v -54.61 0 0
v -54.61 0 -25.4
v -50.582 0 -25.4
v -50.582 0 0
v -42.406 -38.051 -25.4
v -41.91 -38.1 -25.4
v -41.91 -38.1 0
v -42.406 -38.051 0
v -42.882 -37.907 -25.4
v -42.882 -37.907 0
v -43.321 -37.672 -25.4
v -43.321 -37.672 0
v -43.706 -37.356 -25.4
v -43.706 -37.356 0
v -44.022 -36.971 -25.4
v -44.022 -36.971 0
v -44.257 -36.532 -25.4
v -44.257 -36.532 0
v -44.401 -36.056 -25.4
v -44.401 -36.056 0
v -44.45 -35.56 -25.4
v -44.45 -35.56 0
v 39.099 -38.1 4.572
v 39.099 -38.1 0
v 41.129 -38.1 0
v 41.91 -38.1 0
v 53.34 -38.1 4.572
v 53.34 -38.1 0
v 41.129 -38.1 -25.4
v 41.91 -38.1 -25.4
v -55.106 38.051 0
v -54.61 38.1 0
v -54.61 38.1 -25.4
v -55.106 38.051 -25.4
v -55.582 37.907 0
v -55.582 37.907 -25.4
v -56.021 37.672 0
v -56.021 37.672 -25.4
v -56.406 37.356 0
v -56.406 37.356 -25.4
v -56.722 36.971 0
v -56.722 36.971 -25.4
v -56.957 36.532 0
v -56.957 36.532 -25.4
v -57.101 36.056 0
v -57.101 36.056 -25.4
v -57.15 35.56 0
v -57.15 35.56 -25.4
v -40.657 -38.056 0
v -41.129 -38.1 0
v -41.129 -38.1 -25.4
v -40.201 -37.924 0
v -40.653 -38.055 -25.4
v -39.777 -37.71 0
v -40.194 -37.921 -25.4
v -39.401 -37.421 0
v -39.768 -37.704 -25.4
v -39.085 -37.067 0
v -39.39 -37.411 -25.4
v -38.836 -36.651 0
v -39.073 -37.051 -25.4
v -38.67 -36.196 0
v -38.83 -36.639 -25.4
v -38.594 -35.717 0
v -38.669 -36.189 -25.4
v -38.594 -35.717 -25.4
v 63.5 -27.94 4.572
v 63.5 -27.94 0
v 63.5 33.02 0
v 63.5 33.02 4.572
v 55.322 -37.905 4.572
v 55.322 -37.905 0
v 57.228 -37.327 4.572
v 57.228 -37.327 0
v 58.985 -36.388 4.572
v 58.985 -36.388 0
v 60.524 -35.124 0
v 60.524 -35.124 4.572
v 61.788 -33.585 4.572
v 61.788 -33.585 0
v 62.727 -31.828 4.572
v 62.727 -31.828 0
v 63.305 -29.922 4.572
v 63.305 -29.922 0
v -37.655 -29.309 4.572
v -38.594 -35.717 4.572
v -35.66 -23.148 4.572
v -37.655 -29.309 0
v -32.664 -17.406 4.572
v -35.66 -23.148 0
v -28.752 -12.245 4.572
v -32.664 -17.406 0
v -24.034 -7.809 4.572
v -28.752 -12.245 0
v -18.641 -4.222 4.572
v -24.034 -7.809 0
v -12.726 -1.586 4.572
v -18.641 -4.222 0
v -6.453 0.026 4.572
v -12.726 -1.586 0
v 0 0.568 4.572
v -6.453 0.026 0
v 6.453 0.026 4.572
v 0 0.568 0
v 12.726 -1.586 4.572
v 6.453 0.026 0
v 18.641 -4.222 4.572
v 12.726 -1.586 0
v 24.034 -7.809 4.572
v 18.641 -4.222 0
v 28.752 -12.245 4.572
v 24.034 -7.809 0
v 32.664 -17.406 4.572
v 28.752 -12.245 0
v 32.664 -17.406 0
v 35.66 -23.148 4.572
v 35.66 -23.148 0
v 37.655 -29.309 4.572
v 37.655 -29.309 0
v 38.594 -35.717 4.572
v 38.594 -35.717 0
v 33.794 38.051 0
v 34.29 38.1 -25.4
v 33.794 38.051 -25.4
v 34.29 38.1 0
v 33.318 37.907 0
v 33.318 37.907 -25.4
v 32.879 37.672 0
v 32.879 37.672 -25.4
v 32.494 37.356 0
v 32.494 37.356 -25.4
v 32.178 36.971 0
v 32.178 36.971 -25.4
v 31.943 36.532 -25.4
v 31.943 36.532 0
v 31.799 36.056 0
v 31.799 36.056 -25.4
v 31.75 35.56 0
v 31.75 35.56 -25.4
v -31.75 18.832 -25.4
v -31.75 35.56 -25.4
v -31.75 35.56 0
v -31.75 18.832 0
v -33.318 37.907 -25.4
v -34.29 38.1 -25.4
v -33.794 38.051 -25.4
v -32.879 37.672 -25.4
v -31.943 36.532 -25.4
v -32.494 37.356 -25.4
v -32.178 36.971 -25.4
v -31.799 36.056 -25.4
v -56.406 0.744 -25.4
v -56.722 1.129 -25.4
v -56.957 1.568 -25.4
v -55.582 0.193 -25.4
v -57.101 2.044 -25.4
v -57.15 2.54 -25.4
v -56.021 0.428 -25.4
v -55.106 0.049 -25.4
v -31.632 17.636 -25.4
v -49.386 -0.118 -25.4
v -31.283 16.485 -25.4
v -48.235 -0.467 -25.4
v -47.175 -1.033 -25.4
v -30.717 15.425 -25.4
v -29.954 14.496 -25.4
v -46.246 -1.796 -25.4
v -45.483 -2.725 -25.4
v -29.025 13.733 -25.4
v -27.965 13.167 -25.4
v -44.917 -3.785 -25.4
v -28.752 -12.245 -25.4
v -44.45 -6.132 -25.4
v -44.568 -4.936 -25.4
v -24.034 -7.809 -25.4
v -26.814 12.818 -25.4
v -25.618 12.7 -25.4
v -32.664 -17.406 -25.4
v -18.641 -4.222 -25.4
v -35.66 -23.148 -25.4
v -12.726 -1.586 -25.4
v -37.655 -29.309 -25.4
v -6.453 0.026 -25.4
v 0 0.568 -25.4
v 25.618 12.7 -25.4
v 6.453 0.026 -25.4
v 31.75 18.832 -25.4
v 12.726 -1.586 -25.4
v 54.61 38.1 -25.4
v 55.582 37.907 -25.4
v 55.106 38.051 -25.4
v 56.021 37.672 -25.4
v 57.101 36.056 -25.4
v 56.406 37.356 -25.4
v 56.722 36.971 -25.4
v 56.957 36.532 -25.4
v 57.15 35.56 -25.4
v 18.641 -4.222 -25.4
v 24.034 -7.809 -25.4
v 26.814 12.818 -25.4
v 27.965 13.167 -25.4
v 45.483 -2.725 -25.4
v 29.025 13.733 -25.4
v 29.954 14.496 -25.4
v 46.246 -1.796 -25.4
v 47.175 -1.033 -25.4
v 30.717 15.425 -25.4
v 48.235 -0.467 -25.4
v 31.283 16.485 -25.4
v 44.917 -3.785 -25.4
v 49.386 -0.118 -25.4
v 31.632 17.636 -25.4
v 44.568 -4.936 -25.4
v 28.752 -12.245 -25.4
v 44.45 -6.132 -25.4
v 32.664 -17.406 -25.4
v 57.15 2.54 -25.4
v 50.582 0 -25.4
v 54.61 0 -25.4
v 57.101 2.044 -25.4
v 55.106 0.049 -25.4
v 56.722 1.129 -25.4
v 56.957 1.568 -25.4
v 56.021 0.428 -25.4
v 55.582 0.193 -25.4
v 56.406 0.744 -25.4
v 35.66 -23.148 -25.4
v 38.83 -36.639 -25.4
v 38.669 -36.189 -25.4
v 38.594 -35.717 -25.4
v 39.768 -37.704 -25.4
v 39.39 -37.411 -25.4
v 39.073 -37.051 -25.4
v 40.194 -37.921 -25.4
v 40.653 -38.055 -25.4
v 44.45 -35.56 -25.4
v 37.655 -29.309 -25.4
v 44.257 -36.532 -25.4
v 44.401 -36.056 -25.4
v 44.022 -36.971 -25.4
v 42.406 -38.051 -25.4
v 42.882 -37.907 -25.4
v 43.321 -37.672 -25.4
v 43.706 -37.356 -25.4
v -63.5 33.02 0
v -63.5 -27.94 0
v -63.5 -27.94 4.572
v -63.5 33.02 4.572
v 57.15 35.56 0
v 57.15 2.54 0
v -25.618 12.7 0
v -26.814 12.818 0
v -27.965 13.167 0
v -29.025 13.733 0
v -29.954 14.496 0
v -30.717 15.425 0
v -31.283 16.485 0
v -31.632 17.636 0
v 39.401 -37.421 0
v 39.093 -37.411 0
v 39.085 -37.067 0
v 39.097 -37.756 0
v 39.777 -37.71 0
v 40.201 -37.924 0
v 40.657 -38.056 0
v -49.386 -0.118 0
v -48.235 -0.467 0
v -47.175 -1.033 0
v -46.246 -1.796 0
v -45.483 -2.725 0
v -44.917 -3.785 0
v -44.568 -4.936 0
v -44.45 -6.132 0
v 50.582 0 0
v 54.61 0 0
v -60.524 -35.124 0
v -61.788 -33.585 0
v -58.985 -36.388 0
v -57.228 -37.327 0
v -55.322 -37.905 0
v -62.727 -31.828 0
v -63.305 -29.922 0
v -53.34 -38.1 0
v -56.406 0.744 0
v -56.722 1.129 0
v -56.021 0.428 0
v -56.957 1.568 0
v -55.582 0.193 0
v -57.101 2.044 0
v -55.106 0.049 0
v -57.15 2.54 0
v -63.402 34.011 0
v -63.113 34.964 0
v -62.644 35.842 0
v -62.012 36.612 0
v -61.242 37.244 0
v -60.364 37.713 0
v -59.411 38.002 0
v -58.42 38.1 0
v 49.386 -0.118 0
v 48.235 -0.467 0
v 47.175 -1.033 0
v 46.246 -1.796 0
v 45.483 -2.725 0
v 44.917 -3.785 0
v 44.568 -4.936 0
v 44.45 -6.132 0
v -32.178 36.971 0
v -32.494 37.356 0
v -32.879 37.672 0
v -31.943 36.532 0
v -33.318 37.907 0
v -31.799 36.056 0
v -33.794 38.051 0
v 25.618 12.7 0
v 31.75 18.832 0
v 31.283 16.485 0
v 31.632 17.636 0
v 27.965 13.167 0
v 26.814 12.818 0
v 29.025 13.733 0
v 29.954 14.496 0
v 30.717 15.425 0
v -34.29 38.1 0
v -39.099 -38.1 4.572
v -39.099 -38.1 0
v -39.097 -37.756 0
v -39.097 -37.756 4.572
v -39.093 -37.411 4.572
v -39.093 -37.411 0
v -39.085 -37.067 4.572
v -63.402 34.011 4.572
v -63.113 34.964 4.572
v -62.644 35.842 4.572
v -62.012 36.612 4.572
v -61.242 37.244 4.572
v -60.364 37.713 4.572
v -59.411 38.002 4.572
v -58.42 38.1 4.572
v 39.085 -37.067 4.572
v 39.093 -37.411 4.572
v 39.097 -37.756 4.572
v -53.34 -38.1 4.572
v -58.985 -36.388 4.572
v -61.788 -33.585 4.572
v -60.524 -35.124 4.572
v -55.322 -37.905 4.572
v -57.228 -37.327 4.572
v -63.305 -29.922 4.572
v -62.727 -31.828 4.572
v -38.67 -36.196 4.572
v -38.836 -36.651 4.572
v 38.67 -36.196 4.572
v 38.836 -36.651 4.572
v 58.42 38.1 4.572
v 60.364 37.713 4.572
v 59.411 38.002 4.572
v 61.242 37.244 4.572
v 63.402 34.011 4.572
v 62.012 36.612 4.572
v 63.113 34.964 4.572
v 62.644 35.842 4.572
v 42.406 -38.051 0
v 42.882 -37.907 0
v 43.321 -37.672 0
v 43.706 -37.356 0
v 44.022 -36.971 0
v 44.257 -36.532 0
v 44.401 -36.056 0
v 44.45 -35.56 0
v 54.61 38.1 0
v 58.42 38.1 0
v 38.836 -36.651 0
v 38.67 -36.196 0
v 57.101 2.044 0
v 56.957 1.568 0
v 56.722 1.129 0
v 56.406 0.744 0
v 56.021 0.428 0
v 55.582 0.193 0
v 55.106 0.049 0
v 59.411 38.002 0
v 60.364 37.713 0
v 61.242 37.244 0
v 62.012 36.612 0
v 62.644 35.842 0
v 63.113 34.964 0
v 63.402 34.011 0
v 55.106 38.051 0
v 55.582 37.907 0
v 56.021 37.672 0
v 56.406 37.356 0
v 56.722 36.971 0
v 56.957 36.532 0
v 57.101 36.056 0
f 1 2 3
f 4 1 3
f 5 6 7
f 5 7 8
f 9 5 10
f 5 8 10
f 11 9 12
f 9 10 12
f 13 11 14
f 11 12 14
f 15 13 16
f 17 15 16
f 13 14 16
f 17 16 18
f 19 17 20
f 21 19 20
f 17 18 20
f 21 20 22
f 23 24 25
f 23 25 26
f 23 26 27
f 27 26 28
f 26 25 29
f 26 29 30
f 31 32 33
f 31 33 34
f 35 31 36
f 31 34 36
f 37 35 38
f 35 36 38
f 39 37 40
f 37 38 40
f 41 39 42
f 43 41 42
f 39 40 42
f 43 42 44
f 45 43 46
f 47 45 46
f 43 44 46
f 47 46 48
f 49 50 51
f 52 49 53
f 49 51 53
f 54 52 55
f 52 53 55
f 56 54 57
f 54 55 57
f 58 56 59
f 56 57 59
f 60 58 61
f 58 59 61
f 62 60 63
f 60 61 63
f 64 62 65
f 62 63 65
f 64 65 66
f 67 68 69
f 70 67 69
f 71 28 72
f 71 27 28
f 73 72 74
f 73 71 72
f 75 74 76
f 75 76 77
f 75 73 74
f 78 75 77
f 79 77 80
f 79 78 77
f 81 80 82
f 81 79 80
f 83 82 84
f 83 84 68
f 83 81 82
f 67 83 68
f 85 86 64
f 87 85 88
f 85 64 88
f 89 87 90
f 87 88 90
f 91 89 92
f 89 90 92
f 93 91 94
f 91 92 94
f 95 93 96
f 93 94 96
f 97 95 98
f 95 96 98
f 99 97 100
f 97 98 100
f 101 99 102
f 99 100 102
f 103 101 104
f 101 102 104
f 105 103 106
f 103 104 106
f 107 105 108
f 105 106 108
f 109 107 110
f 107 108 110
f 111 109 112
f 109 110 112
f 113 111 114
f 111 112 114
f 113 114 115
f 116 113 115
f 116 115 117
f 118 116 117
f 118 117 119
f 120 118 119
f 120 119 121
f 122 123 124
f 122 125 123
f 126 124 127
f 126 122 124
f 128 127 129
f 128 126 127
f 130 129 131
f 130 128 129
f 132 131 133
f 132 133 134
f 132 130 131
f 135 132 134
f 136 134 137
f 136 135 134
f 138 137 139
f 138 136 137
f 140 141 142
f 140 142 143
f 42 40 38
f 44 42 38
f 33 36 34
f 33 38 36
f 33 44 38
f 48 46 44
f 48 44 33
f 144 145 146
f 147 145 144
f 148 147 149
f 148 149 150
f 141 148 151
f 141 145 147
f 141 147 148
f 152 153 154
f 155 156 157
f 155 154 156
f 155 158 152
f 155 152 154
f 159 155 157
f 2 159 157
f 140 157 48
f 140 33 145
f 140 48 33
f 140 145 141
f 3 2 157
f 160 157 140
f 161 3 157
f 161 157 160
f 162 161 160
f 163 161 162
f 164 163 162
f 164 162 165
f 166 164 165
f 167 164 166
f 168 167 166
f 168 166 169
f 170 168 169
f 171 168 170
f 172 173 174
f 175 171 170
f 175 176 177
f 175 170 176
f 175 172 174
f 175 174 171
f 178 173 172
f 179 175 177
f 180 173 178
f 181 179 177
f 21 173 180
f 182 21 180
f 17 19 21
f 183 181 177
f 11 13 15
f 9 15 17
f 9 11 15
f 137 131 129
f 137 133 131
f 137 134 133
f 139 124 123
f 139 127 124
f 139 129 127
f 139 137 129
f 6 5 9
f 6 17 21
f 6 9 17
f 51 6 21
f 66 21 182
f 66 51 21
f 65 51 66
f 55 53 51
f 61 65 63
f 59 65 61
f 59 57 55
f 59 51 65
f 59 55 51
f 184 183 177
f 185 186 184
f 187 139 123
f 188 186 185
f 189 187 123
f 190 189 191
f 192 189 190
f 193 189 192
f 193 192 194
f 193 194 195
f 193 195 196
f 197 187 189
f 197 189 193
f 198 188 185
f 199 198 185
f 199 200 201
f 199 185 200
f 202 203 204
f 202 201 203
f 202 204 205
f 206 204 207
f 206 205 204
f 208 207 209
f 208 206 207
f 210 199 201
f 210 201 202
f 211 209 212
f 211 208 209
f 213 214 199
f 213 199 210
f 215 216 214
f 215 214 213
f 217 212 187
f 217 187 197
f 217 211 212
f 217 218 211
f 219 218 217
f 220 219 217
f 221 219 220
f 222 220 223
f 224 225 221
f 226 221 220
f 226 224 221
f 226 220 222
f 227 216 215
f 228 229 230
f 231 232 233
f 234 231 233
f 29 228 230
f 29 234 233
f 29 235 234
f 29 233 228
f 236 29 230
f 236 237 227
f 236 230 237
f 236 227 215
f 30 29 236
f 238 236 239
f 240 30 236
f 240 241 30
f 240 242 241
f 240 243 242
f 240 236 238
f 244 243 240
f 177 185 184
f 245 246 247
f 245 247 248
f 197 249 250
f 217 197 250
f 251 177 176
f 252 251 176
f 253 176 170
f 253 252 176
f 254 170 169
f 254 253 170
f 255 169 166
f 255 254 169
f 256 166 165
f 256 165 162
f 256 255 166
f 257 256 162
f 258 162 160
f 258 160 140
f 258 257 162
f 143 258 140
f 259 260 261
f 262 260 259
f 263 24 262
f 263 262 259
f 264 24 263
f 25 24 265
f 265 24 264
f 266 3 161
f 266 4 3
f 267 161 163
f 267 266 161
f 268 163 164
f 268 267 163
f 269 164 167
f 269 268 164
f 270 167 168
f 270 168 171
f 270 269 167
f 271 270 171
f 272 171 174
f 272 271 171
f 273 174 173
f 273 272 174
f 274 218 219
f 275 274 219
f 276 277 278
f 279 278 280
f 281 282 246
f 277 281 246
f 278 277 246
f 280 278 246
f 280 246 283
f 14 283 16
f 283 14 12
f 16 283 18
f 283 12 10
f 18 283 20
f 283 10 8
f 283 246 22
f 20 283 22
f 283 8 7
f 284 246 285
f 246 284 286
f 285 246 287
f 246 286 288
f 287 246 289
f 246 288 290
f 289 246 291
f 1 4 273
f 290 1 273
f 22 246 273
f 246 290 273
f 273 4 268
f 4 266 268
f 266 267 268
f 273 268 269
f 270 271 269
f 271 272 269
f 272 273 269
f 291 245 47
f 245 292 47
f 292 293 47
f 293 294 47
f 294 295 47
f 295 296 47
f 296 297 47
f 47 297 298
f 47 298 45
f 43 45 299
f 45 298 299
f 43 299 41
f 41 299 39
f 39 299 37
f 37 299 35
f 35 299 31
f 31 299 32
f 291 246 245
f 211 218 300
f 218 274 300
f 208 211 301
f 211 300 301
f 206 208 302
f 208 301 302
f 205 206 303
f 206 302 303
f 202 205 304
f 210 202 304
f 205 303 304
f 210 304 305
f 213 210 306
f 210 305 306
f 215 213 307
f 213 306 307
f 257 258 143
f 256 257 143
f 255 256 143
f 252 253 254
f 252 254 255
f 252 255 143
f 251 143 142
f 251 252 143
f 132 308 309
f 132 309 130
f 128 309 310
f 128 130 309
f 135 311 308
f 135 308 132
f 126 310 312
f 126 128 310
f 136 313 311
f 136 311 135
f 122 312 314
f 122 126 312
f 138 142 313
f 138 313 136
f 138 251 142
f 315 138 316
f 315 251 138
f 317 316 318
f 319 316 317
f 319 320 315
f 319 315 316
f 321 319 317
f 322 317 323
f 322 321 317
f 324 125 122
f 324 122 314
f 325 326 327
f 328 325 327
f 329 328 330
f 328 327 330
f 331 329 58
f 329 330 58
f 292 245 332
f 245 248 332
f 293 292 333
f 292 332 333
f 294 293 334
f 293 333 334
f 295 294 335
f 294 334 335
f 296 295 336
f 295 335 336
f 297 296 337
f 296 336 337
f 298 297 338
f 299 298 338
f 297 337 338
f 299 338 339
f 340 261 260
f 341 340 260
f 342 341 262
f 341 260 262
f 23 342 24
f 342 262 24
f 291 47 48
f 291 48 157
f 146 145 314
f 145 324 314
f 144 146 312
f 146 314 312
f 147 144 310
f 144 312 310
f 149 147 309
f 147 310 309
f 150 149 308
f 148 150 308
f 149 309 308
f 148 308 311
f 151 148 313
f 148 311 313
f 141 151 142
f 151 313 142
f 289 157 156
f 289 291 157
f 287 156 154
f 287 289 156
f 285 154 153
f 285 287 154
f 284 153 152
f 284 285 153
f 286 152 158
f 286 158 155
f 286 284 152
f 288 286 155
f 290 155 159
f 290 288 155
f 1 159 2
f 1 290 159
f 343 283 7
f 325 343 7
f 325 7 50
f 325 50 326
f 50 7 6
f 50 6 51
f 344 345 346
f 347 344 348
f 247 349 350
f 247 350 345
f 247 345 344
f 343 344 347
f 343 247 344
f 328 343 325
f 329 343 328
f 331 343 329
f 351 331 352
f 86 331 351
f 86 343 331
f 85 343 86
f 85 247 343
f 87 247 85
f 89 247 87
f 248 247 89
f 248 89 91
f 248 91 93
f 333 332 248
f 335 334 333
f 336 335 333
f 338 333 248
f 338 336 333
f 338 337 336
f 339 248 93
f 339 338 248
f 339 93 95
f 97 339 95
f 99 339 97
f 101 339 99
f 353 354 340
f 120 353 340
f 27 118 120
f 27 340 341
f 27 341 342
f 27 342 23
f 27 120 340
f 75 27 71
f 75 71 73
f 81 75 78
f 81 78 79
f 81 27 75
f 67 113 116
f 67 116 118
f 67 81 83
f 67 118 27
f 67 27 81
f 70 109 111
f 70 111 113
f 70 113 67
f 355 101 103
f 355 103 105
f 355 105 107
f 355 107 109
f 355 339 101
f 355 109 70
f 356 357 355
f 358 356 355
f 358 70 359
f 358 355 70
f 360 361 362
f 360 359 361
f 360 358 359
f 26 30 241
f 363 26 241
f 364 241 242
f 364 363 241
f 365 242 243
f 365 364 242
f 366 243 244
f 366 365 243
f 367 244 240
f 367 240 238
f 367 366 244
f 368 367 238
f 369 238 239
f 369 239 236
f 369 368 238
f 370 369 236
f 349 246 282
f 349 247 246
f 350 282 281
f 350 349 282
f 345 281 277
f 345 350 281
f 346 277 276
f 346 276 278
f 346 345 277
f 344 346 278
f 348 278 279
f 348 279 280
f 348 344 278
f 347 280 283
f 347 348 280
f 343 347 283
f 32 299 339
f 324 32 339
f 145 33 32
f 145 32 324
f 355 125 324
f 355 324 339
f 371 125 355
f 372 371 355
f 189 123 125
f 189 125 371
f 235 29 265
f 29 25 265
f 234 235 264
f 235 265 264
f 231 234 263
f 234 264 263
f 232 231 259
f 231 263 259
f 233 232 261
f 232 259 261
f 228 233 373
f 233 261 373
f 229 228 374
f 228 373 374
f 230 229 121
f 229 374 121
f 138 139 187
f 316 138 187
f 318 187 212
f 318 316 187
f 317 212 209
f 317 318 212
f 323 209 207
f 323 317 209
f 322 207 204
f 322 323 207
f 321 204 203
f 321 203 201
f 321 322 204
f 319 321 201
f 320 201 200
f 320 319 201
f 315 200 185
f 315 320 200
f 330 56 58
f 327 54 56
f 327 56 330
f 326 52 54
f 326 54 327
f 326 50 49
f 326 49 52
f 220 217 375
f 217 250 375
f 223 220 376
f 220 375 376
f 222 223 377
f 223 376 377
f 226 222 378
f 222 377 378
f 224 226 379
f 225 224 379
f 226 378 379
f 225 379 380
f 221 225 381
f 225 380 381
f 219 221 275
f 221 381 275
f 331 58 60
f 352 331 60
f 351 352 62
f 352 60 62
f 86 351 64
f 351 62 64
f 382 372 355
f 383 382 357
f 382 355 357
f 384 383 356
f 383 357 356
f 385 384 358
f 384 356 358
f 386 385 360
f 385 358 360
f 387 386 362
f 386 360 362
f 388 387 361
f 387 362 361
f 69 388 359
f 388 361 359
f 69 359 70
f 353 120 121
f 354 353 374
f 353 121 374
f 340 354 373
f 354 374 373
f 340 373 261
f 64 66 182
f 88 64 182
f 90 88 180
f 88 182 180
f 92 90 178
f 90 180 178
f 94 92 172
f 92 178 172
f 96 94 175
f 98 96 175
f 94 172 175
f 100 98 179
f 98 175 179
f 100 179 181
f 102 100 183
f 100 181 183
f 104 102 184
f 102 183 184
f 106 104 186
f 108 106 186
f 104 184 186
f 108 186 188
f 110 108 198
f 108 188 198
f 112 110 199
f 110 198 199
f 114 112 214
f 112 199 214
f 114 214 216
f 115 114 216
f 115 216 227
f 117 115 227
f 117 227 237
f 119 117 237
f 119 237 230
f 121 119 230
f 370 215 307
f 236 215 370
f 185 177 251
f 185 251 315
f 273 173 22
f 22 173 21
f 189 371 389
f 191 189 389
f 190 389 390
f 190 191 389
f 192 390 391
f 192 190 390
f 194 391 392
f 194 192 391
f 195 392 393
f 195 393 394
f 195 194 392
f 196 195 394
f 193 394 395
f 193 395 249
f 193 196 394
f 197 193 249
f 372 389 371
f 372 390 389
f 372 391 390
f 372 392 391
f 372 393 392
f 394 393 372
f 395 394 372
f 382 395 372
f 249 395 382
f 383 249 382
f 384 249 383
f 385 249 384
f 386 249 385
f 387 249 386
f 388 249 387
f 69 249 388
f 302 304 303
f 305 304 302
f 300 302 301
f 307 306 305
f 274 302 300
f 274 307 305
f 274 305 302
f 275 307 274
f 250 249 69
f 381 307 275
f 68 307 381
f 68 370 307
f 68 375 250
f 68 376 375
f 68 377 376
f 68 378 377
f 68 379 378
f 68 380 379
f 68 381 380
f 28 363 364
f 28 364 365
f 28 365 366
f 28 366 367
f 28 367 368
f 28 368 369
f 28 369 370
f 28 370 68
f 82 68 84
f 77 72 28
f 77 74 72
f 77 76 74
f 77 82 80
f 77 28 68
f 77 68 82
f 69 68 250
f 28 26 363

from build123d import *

# Parameters (mm, degrees)
F0_W      = 127
F0_H      = 76.2
F1_DEPTH  = 4.572
F2_W      = 114.3
F2_H      = 76.2
F3_DEPTH  = 25.4
F4_W      = 63.5
F4_H      = 25.4
F4_W_2    = 12.7
F4_H_2    = 38.1
F4_R      = 38.6678322827
F5_DEPTH  = 25.4
F6_R      = 10.16
F7_R      = 2.54
F8_R      = 6.1321024484
F9_R      = 5.08
F10_R     = 10.16
F12_DEPTH = 5.08


with BuildPart() as f1:
    # F0 (on Top) → F1 (new body)
    with BuildSketch(Plane.XY):
        Rectangle(F0_W, F0_H)
    extrude(amount=F1_DEPTH)

    # F2 (on face) → F3 (join)
    with BuildSketch(Plane(origin=(0, 0, 0), x_dir=(1, 0, 0), z_dir=(0, 0, -1))):
        Rectangle(F2_W, F2_H)
    extrude(amount=F3_DEPTH)

    # F4 (on face) → F5 (cut)
    with BuildSketch(Plane(origin=(0, 0, -25.4), x_dir=(1, 0, 0), z_dir=(0, 0, -1))):
        with Locations((0, -25.4)):
            Rectangle(F4_W, F4_H)
        with Locations((-50.8, 19.05)):
            Rectangle(F4_W_2, F4_H_2)
        with Locations((50.8, 19.05)):
            Rectangle(F4_W_2, F4_H_2)
        with Locations((0, 38.1)):
            Circle(F4_R)
    extrude(amount=-F5_DEPTH, mode=Mode.SUBTRACT)

    # F6
    f6_edges = [f1.edges().sort_by_distance(p)[0] for p in [
        (-63.5, -38.1, 2.286),
    ]]
    fillet(f6_edges, radius=F6_R)

    # F7
    f7_edges = [f1.edges().sort_by_distance(p)[0] for p in [
        (-44.45, -38.1, -12.7),
        (38.667832, -38.1, -12.7),
        (-38.667832, -38.1, -12.7),
        (44.45, -38.1, -12.7),
        (57.15, 0, -12.7),
        (-57.15, 0, -12.7),
        (-31.75, 38.1, -12.7),
        (-57.15, 38.1, -12.7),
        (57.15, 38.1, -12.7),
        (31.75, 38.1, -12.7),
    ]]
    fillet(f7_edges, radius=F7_R)

    # F8
    f8_edges = [f1.edges().sort_by_distance(p)[0] for p in [
        (-44.45, 0, -12.7),
        (44.45, 0, -12.7),
        (-31.75, 12.7, -12.7),
        (31.75, 12.7, -12.7),
    ]]
    fillet(f8_edges, radius=F8_R)

    # F9
    f9_edges = [f1.edges().sort_by_distance(p)[0] for p in [
        (-63.5, 38.1, 2.286),
        (63.5, 38.1, 2.286),
    ]]
    fillet(f9_edges, radius=F9_R)

    # F10
    f10_edges = [f1.edges().sort_by_distance(p)[0] for p in [
        (63.5, -38.1, 2.286),
    ]]
    fillet(f10_edges, radius=F10_R)

    # F11 (on face) → F12 (cut)
    with BuildSketch(Plane(origin=(0, 0, 0), x_dir=(1, 0, 0), z_dir=(0, 0, -1))):
        with BuildLine():
            ThreePointArc((39.08503897, 37.0672740206), (39.0952697519, 37.5835919656), (39.0986802109, 38.1))
            Line((39.0986802109, 38.1), (38.6678322827, 38.1))
            Line((38.6678322827, 38.1), (-38.6678322827, 38.1))
            Line((-38.6678322827, 38.1), (-39.0986802109, 38.1))
            ThreePointArc((-39.0986802109, 38.1), (-39.0952697519, 37.5835919656), (-39.08503897, 37.0672740206))
            ThreePointArc((-39.08503897, 37.0672740206), (-38.7421543292, 36.4273480296), (-38.5943063027, 35.7165624699))
            ThreePointArc((-38.5943063027, 35.7165624699), (0, -0.5678322827), (38.5943063027, 35.7165624699))
            ThreePointArc((38.5943063027, 35.7165624699), (38.7421543292, 36.4273480296), (39.08503897, 37.0672740206))
        make_face()
    extrude(amount=-F12_DEPTH, mode=Mode.SUBTRACT)


solid = f1.part
